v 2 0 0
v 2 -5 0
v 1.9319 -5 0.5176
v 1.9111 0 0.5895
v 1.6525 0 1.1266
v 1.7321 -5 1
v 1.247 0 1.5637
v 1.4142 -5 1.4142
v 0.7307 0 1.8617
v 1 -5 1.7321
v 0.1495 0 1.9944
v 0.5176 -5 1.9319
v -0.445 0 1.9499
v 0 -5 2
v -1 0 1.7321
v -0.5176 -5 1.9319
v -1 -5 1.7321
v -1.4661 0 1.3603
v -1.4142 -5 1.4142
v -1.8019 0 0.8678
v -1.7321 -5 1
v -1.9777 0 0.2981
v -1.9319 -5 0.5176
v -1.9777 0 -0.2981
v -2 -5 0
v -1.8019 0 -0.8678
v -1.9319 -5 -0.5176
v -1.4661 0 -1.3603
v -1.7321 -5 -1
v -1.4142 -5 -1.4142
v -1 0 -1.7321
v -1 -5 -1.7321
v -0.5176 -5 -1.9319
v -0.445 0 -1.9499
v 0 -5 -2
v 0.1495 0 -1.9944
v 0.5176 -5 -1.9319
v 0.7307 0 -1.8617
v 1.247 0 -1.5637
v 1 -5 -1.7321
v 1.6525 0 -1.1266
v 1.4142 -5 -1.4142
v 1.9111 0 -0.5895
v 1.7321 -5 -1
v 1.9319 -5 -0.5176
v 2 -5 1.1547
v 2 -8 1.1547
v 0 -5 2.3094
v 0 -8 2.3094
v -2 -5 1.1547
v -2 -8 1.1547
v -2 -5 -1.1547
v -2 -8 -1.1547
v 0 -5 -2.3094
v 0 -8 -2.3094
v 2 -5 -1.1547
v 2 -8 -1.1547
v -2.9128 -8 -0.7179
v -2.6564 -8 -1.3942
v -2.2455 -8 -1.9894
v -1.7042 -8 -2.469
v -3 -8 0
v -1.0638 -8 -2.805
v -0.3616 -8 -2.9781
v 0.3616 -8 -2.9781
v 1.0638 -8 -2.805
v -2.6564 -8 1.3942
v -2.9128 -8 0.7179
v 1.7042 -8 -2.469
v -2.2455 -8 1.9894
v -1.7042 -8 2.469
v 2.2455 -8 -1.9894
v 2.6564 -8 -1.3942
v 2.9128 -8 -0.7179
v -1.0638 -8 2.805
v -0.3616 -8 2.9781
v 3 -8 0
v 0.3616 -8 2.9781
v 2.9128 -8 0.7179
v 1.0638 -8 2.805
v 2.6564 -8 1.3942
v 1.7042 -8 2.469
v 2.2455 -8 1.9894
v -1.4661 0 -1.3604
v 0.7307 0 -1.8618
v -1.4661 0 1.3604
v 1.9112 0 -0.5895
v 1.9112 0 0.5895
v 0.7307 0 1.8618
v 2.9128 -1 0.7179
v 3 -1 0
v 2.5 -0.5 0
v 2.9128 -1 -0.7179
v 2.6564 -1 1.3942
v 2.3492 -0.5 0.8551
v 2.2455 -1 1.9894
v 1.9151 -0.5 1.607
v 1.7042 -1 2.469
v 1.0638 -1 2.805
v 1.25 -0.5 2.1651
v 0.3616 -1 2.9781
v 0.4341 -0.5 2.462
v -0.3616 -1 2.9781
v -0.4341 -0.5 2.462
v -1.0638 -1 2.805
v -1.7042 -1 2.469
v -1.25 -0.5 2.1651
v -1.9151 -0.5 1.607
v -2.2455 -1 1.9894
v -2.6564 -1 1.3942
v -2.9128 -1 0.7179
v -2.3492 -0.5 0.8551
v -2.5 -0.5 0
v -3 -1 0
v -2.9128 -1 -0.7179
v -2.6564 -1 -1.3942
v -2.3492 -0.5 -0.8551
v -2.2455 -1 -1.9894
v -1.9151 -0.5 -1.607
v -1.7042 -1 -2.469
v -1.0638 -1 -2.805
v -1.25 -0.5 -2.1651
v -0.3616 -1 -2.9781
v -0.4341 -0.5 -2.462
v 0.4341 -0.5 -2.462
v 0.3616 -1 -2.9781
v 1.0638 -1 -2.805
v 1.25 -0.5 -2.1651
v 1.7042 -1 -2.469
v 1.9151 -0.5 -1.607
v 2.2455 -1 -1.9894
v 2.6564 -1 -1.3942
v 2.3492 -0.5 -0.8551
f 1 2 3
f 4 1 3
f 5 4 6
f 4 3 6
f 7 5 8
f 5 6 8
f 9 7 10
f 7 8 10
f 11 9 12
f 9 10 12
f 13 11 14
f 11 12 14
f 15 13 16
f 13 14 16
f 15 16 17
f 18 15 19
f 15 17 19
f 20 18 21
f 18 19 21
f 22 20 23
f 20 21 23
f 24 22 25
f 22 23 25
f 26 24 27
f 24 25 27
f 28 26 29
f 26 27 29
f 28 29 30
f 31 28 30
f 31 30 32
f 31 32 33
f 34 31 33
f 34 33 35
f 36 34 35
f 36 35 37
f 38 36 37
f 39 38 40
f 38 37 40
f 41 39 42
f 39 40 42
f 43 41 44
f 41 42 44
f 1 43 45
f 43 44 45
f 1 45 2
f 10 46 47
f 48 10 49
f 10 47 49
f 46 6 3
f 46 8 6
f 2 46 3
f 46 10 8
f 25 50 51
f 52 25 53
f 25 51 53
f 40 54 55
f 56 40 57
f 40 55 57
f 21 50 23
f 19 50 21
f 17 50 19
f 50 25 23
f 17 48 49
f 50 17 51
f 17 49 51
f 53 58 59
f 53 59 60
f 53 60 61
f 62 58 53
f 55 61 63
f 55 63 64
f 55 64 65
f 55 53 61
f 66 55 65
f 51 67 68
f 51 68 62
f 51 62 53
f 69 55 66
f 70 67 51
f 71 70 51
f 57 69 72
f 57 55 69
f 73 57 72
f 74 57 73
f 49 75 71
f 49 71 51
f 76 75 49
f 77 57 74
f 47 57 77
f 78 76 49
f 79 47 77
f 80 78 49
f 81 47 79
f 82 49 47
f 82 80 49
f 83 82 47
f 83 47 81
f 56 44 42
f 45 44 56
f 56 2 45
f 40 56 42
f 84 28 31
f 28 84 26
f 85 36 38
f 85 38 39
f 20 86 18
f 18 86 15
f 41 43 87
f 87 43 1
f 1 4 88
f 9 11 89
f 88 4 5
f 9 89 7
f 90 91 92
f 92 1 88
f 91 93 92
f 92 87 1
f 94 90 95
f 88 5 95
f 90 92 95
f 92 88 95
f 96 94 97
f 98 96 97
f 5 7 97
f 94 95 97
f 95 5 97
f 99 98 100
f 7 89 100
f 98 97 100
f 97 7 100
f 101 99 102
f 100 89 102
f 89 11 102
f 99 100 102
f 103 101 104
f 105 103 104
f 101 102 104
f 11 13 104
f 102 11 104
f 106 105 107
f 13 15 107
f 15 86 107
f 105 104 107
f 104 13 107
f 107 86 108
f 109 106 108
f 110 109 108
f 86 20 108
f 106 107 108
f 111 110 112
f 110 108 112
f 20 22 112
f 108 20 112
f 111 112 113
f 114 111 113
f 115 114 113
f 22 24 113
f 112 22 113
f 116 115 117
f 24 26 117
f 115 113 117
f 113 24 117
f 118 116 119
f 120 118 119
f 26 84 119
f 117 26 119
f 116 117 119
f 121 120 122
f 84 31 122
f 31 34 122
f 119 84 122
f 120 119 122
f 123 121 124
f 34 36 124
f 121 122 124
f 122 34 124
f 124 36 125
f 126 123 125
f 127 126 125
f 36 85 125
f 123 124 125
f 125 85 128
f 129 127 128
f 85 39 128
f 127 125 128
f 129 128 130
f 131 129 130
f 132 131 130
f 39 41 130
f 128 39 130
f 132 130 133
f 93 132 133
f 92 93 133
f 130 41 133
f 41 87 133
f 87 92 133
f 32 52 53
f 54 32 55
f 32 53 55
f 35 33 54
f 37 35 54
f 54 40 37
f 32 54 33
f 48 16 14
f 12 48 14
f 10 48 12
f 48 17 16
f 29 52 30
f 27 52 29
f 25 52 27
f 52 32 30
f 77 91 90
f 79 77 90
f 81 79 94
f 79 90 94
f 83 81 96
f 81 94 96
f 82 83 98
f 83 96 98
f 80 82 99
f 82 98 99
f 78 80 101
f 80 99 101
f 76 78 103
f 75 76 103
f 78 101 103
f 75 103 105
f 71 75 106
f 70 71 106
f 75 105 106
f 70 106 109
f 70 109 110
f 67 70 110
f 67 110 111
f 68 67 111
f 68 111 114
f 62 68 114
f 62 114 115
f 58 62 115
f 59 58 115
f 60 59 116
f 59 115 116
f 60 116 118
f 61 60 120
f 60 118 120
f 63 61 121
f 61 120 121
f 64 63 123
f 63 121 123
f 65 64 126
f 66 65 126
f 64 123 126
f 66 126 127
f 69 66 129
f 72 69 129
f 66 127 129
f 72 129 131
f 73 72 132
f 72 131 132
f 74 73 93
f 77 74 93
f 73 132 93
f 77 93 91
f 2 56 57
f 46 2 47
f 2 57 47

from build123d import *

# Parameters (mm, degrees)
F0_R     = 3
F1_DEPTH = 8
F3_DEPTH = 3
F4_R     = 2
F5_DEPTH = 25
F6_SIZE  = 0.99999


# Not quite as in the source:
# - a fillet or chamfer is up to 0.001 mm smaller than in the source, because OpenCascade refuses the exact size


with BuildPart() as f1:
    # F0 (on Front) → F1 (new body)
    with BuildSketch(Plane.XZ):
        Circle(F0_R)
    extrude(amount=F1_DEPTH)

    # F2 (on face) → F3 (cut)
    with BuildSketch(Plane.XZ.offset(8)):
        Polygon((2, 1.1547005384), (0, 2.3094010768), (-2, 1.1547005384), (-2, -1.1547005384), (0, -2.3094010768), (2, -1.1547005384), align=None)
    extrude(amount=-F3_DEPTH, mode=Mode.SUBTRACT)

    # F4 (on face) → F5 (cut)
    with BuildSketch(Plane.XZ.offset(5)):
        Circle(F4_R)
    extrude(amount=-F5_DEPTH, mode=Mode.SUBTRACT)

    # F6 (size 1 in the source; OpenCascade refuses exactly that, so slightly less here)
    f6_edges = [f1.edges().sort_by_distance(p)[0] for p in [
        (-3, 0, 0),
    ]]
    chamfer(f6_edges, length=F6_SIZE)


solid = f1.part
